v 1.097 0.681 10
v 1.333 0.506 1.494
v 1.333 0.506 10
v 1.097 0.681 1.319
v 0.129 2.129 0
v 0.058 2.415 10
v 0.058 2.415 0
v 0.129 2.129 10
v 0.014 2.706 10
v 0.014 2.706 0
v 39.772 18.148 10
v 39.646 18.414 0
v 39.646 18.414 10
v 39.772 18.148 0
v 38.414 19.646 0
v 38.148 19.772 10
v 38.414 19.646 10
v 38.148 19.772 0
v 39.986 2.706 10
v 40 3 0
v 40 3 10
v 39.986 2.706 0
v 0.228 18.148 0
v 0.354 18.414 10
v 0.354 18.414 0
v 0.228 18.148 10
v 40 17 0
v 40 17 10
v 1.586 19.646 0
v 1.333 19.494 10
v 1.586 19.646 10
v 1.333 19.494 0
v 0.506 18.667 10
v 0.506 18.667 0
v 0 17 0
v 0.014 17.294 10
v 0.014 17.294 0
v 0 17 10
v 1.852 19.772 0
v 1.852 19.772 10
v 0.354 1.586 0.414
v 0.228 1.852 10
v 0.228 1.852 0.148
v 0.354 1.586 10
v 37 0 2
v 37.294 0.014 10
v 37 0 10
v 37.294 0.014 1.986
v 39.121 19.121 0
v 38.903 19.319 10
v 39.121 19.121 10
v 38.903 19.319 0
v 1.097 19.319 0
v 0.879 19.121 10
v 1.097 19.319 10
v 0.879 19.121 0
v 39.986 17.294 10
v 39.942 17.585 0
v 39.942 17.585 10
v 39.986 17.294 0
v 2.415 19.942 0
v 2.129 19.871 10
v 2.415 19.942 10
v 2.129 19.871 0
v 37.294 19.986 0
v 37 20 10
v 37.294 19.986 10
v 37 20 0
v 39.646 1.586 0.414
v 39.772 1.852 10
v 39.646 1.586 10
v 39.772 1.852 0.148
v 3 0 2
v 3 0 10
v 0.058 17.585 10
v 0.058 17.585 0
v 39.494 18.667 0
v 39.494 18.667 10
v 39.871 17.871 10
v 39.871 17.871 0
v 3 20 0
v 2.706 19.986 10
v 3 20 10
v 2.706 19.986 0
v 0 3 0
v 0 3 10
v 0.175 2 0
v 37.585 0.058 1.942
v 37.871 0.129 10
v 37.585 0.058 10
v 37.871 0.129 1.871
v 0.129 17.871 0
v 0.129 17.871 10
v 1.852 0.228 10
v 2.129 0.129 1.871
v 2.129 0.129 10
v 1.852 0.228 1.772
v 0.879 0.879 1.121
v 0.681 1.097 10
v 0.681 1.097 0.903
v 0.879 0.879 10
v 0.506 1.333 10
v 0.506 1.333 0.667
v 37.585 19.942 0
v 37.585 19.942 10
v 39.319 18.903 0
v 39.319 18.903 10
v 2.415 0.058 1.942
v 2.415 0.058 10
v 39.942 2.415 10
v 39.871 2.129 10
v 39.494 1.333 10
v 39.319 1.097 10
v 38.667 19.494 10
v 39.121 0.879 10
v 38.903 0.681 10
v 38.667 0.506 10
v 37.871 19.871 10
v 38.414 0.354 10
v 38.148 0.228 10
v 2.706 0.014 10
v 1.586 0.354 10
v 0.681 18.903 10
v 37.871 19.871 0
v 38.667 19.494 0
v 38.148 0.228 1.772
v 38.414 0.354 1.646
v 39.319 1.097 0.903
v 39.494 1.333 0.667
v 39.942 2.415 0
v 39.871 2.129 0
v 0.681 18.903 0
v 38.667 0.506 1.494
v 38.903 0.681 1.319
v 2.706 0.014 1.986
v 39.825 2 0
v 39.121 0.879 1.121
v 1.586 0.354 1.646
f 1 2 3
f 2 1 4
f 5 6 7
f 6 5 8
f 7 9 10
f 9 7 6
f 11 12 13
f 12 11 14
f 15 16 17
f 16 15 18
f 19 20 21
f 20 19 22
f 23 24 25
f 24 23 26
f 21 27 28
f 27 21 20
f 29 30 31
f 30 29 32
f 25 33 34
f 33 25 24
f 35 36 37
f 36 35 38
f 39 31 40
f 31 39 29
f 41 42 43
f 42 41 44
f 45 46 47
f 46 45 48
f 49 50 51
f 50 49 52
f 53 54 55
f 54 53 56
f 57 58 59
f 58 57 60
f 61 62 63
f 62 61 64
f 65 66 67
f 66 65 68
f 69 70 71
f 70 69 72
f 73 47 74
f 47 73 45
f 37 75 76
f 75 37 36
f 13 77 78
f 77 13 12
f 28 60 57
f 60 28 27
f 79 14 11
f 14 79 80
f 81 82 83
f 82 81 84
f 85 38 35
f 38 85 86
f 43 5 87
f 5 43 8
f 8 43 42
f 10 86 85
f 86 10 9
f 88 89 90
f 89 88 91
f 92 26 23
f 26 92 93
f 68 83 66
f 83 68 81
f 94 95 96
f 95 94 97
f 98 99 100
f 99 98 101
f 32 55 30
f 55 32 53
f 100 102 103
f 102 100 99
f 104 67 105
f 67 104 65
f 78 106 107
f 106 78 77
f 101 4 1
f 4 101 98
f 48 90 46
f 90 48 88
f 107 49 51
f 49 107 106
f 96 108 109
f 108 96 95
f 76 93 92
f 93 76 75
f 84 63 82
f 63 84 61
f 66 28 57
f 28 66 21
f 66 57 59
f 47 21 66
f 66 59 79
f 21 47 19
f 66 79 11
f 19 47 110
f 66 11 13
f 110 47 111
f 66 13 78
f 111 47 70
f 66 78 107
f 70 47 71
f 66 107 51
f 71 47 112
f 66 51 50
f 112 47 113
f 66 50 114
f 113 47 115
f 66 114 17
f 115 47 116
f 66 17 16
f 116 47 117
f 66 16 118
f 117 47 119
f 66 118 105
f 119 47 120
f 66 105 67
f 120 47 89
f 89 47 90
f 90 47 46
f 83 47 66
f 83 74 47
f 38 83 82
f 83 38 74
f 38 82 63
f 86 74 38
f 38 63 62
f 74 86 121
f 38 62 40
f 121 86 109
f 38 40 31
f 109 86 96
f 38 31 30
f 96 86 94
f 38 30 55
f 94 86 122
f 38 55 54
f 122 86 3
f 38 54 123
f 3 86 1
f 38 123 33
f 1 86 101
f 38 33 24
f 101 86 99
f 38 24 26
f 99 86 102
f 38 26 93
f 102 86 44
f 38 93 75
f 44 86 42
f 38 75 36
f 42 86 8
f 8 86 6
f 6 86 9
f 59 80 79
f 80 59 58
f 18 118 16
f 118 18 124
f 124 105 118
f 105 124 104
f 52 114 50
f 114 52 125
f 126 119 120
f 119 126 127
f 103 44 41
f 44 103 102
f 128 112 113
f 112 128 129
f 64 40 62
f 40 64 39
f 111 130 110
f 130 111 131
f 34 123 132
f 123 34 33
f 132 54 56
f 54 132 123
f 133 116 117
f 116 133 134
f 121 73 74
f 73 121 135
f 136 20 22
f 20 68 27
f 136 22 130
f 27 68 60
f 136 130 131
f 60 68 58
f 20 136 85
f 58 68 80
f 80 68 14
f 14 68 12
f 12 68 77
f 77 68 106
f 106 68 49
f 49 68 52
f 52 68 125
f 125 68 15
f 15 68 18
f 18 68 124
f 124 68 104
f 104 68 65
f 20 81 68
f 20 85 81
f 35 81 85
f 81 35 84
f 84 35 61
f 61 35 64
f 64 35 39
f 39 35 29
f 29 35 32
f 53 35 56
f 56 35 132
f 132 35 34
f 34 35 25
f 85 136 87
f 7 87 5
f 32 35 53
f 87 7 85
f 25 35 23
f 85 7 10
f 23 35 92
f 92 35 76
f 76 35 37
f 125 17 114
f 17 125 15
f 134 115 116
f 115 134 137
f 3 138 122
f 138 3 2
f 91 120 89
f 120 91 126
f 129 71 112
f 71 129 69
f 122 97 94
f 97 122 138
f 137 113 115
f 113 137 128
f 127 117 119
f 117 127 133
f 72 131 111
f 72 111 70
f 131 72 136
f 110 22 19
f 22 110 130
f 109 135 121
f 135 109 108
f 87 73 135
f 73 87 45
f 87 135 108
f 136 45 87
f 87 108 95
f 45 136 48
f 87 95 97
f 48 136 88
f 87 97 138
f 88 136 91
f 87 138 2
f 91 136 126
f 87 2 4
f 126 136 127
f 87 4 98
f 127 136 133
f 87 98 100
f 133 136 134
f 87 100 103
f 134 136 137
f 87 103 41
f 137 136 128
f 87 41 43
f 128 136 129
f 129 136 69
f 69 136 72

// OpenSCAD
// The bottom-front cutter crosses both front XY corner arcs.
$fn = 64;
body_length = 40;
body_width = 20;
body_height = 10;
corner_1_radius = 3;
corner_2_radius = 3;
corner_3_radius = 3;
corner_4_radius = 3;
chamfer_1_width = 2;

module clipped_arc_plate(body_length=40, body_width=20, body_height=10,
                          corner_1_radius=3, corner_2_radius=3,
                          corner_3_radius=3, corner_4_radius=3, chamfer_1_width=2) {
    r1=corner_1_radius; r2=corner_2_radius;
    r3=corner_3_radius; r4=corner_4_radius;
    assert(min(body_length,body_width,body_height,r1,r2,r3,r4,chamfer_1_width)>0);
    assert(2*max(r1,r2,r3,r4)<min(body_length,body_width));
    assert(chamfer_1_width<min(body_width,body_height));
    difference() {
        linear_extrude(height=body_height) hull() {
            translate([r1,r1]) circle(r=r1);
            translate([body_length-r2,r2]) circle(r=r2);
            translate([body_length-r3,body_width-r3]) circle(r=r3);
            translate([r4,body_width-r4]) circle(r=r4);
        }
        multmatrix([[0,0,1,-1],[1,0,0,0],[0,1,0,0],[0,0,0,1]])
            linear_extrude(height=body_length+2)
                polygon([[0,0],[chamfer_1_width,0],[0,chamfer_1_width]]);
    }
}

clipped_arc_plate(body_length,body_width,body_height,corner_1_radius,
    corner_2_radius,corner_3_radius,corner_4_radius,chamfer_1_width);
